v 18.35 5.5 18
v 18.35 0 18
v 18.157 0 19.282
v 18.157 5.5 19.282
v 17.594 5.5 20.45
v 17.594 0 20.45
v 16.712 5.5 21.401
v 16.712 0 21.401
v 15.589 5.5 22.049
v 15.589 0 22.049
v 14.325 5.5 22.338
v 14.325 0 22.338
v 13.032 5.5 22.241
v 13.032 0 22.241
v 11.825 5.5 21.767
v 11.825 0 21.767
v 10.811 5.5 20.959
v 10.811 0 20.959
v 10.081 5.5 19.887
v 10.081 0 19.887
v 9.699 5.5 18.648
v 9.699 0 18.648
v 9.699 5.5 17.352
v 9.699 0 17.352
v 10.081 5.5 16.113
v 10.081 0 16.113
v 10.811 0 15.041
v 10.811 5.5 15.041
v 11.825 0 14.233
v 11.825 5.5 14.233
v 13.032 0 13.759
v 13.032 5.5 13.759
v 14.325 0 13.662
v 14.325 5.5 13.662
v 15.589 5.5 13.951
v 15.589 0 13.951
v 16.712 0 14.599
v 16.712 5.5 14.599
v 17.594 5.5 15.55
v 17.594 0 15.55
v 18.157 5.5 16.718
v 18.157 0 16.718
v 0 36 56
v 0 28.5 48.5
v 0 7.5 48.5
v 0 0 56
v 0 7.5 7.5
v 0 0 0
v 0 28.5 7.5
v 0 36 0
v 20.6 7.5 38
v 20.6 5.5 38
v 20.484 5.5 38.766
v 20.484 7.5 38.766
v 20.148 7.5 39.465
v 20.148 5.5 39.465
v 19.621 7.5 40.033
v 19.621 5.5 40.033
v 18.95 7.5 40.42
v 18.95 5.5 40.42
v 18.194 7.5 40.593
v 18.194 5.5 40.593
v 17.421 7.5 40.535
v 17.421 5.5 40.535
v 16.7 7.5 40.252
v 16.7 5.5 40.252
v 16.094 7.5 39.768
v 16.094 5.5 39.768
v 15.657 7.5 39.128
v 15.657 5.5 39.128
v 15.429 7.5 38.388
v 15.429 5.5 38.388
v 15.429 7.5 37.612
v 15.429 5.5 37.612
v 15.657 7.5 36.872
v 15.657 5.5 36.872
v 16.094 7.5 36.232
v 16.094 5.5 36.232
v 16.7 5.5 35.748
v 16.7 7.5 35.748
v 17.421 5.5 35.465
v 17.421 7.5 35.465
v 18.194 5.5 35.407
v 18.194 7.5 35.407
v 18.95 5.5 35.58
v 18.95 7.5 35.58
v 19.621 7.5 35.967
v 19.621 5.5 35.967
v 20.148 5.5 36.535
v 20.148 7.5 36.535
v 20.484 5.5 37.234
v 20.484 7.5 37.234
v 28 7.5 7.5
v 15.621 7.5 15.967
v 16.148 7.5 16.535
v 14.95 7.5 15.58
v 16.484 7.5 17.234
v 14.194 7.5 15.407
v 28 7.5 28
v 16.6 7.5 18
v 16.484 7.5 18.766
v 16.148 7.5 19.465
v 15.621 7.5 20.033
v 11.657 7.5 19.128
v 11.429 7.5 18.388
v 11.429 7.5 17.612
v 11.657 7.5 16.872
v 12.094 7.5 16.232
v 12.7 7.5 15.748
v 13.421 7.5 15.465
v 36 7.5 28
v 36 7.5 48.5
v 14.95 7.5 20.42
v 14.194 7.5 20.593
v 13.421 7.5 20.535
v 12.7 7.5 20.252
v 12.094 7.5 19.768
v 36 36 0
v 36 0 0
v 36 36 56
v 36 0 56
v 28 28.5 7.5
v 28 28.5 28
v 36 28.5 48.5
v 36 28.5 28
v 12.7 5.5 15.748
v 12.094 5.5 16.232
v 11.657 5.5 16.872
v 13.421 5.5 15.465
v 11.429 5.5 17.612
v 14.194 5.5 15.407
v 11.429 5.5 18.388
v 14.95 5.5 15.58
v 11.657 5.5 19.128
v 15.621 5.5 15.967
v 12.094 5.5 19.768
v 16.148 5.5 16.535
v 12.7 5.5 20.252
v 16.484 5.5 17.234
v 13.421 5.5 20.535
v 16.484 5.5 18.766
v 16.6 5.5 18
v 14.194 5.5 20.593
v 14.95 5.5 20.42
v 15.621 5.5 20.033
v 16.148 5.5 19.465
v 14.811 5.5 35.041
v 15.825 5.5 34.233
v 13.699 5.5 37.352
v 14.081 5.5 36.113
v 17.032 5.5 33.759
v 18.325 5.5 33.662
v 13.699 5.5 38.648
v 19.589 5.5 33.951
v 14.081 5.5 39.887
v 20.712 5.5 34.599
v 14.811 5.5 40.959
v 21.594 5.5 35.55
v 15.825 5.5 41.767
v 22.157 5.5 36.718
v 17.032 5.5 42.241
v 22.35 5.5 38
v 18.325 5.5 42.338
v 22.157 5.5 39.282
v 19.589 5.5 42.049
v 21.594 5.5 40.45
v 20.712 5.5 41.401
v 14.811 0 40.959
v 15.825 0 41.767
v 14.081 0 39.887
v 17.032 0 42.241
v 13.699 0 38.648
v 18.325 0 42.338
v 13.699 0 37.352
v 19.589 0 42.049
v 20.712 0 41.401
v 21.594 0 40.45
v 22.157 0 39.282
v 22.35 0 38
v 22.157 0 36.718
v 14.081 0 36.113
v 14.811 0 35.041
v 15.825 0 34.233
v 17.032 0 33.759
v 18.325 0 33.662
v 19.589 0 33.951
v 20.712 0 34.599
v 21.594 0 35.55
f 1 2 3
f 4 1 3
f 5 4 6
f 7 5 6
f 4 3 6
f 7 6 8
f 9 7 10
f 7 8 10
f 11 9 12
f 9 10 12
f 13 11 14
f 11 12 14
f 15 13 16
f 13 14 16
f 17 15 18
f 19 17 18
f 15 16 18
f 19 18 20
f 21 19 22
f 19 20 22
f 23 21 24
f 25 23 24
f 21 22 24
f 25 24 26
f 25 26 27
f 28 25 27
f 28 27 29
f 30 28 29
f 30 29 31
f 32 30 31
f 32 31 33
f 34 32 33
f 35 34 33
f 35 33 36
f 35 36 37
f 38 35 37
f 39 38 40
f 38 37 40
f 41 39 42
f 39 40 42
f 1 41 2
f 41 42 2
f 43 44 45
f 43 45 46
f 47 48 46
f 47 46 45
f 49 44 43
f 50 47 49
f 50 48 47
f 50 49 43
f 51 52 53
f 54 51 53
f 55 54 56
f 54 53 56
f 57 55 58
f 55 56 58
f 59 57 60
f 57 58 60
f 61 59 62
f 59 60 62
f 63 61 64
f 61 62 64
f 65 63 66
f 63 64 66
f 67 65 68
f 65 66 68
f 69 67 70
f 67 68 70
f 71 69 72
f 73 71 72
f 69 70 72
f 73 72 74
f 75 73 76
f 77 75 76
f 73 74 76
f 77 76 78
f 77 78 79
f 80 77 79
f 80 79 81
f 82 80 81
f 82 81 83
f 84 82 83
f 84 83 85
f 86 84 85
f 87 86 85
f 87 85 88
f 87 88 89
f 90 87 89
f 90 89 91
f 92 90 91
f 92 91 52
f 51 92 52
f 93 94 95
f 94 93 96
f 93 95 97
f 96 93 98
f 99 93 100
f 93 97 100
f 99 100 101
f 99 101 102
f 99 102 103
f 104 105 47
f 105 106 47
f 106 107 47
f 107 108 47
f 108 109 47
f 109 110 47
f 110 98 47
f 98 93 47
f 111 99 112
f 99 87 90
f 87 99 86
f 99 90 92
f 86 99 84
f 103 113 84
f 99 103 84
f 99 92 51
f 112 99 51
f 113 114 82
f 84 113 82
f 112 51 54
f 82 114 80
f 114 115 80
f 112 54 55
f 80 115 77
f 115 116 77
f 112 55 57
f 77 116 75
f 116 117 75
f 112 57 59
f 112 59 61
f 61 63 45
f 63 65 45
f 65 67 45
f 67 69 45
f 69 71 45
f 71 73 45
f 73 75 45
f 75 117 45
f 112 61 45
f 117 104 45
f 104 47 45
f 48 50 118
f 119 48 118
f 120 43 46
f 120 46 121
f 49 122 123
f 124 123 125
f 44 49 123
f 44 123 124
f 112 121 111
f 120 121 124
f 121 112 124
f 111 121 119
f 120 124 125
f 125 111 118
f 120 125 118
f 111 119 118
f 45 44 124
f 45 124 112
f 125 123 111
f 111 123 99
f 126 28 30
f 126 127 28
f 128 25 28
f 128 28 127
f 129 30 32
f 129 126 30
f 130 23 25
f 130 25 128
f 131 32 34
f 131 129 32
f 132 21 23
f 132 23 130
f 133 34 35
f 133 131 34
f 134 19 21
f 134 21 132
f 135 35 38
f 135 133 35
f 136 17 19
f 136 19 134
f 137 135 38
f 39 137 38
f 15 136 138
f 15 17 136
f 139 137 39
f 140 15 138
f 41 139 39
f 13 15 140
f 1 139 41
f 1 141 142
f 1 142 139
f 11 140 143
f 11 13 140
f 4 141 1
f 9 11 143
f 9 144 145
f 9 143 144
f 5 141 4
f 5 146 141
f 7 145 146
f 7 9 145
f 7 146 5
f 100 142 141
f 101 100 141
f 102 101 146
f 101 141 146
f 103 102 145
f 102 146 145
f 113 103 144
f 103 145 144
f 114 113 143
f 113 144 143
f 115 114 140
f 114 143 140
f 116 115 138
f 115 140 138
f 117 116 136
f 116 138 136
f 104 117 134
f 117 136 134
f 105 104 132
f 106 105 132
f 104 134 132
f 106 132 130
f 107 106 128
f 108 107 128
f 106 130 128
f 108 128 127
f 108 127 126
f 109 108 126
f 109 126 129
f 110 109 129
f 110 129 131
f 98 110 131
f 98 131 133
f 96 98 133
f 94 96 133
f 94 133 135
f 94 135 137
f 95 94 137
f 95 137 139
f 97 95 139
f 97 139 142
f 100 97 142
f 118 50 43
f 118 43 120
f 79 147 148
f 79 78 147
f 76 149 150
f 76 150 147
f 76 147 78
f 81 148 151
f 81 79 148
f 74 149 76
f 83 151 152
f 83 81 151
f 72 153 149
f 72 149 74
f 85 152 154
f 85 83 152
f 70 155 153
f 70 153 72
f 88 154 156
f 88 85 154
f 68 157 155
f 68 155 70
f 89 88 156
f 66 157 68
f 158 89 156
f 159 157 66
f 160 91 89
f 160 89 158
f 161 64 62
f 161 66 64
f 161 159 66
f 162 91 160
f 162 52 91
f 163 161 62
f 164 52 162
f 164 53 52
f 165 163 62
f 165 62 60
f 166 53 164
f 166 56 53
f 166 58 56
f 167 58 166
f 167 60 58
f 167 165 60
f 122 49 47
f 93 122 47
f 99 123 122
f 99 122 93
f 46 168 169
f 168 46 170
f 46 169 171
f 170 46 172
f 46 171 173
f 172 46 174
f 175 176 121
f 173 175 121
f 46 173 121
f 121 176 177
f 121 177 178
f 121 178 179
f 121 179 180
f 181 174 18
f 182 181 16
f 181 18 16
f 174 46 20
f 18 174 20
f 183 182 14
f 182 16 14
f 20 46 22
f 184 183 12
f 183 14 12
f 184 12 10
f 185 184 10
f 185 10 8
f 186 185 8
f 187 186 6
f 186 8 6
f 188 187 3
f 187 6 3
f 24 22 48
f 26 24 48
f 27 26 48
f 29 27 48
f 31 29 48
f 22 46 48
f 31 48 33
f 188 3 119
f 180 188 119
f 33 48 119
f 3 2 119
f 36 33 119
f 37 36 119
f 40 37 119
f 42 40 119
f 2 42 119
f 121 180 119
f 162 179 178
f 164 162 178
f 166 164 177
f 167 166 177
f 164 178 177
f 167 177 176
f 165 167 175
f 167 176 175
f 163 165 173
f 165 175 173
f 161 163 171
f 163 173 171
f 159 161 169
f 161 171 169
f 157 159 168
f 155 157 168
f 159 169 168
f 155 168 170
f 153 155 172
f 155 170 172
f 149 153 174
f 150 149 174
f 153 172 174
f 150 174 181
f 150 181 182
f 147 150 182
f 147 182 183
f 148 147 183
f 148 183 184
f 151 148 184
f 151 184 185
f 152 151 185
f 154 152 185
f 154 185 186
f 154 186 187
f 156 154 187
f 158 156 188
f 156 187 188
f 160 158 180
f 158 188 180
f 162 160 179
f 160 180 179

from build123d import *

# Parameters (mm, degrees)
F0_W     = 36
F0_H     = 36
F1_DEPTH = 56
F2_W     = 21
F2_H     = 41
F3_DEPTH = 28
F4_W     = 21
F4_H     = 20.5
F5_DEPTH = 70
F6_R     = 2.6
F7_DEPTH = 20
F8_R     = 4.35
F9_DEPTH = 5.5


with BuildPart() as f1:
    # F0 (on Top) → F1 (new body)
    with BuildSketch(Plane.XY):
        with Locations((18, 18)):
            Rectangle(F0_W, F0_H)
    extrude(amount=F1_DEPTH)

    # F2 (on face) → F3 (cut)
    with BuildSketch(Plane(origin=(0, 0, 0), x_dir=(0, -1, 0), z_dir=(-1, 0, 0))):
        with Locations((-18, 28)):
            Rectangle(F2_W, F2_H)
    extrude(amount=-F3_DEPTH, mode=Mode.SUBTRACT)

    # F4 (on face) → F5 (cut)
    with BuildSketch(Plane(origin=(0, 0, 0), x_dir=(0, -1, 0), z_dir=(-1, 0, 0))):
        with Locations((-18, 38.25)):
            Rectangle(F4_W, F4_H)
    extrude(amount=-F5_DEPTH, mode=Mode.SUBTRACT)

    # F6 (on face) → F7 (cut)
    with BuildSketch(Plane.XZ):
        with Locations((18, 38)):
            Circle(F6_R)
        with Locations((14, 18)):
            Circle(F6_R)
    extrude(amount=-F7_DEPTH, mode=Mode.SUBTRACT)

    # F8 (on face) → F9 (cut)
    with BuildSketch(Plane.XZ):
        with Locations((18, 38)):
            Circle(F8_R)
        with Locations((14, 18)):
            Circle(F8_R)
    extrude(amount=-F9_DEPTH, mode=Mode.SUBTRACT)


solid = f1.part
